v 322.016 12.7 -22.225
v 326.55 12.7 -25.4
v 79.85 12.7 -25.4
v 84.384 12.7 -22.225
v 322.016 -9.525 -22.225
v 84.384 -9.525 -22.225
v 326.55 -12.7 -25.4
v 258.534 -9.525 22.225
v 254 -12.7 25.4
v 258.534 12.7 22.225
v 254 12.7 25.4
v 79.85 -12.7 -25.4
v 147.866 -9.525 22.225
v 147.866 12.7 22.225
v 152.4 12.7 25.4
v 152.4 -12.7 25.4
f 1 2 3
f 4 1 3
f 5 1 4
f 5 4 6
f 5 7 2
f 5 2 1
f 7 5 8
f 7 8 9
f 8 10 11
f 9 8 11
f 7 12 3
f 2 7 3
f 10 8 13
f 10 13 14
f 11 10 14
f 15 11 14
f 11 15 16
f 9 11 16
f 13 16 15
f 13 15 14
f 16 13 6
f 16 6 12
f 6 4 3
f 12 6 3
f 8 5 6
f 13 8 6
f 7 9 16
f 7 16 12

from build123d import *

# Parameters (mm, degrees)
BOSS_EXTRUDE1_DEPTH = 406.4
CUT_EXTRUDE1_DEPTH  = 408.984411467


with BuildPart() as part:
    # Sketch1 → Boss-Extrude1 (new body)
    with BuildSketch(Plane(origin=(0, 0, 0), x_dir=(0, 0, -1), z_dir=(1, 0, 0))):
        Polygon((-22.225, -9.525), (-22.225, 12.7), (-25.4, 12.7), (-25.4, -12.7), (25.4, -12.7), (25.4, 12.7), (22.225, 12.7), (22.225, -9.525), align=None)
    extrude(amount=BOSS_EXTRUDE1_DEPTH)

    # Sketch2 → Cut-Extrude1 (cut, through all)
    with BuildSketch(Plane(origin=(0, 12.7, 0), x_dir=(1, 0, 0), z_dir=(0, 1, 0))):
        Polygon((203.2, -25.4), (152.4, -25.4), (79.850081258, 25.4), (-62.210264403, 25.4), (-62.210264403, -94.274139353), (523.373076947, -141.453594379), (523.373076947, 25.4), (326.549918742, 25.4), (254, -25.4), align=None)
    extrude(amount=-CUT_EXTRUDE1_DEPTH, mode=Mode.SUBTRACT)


solid = part.part
